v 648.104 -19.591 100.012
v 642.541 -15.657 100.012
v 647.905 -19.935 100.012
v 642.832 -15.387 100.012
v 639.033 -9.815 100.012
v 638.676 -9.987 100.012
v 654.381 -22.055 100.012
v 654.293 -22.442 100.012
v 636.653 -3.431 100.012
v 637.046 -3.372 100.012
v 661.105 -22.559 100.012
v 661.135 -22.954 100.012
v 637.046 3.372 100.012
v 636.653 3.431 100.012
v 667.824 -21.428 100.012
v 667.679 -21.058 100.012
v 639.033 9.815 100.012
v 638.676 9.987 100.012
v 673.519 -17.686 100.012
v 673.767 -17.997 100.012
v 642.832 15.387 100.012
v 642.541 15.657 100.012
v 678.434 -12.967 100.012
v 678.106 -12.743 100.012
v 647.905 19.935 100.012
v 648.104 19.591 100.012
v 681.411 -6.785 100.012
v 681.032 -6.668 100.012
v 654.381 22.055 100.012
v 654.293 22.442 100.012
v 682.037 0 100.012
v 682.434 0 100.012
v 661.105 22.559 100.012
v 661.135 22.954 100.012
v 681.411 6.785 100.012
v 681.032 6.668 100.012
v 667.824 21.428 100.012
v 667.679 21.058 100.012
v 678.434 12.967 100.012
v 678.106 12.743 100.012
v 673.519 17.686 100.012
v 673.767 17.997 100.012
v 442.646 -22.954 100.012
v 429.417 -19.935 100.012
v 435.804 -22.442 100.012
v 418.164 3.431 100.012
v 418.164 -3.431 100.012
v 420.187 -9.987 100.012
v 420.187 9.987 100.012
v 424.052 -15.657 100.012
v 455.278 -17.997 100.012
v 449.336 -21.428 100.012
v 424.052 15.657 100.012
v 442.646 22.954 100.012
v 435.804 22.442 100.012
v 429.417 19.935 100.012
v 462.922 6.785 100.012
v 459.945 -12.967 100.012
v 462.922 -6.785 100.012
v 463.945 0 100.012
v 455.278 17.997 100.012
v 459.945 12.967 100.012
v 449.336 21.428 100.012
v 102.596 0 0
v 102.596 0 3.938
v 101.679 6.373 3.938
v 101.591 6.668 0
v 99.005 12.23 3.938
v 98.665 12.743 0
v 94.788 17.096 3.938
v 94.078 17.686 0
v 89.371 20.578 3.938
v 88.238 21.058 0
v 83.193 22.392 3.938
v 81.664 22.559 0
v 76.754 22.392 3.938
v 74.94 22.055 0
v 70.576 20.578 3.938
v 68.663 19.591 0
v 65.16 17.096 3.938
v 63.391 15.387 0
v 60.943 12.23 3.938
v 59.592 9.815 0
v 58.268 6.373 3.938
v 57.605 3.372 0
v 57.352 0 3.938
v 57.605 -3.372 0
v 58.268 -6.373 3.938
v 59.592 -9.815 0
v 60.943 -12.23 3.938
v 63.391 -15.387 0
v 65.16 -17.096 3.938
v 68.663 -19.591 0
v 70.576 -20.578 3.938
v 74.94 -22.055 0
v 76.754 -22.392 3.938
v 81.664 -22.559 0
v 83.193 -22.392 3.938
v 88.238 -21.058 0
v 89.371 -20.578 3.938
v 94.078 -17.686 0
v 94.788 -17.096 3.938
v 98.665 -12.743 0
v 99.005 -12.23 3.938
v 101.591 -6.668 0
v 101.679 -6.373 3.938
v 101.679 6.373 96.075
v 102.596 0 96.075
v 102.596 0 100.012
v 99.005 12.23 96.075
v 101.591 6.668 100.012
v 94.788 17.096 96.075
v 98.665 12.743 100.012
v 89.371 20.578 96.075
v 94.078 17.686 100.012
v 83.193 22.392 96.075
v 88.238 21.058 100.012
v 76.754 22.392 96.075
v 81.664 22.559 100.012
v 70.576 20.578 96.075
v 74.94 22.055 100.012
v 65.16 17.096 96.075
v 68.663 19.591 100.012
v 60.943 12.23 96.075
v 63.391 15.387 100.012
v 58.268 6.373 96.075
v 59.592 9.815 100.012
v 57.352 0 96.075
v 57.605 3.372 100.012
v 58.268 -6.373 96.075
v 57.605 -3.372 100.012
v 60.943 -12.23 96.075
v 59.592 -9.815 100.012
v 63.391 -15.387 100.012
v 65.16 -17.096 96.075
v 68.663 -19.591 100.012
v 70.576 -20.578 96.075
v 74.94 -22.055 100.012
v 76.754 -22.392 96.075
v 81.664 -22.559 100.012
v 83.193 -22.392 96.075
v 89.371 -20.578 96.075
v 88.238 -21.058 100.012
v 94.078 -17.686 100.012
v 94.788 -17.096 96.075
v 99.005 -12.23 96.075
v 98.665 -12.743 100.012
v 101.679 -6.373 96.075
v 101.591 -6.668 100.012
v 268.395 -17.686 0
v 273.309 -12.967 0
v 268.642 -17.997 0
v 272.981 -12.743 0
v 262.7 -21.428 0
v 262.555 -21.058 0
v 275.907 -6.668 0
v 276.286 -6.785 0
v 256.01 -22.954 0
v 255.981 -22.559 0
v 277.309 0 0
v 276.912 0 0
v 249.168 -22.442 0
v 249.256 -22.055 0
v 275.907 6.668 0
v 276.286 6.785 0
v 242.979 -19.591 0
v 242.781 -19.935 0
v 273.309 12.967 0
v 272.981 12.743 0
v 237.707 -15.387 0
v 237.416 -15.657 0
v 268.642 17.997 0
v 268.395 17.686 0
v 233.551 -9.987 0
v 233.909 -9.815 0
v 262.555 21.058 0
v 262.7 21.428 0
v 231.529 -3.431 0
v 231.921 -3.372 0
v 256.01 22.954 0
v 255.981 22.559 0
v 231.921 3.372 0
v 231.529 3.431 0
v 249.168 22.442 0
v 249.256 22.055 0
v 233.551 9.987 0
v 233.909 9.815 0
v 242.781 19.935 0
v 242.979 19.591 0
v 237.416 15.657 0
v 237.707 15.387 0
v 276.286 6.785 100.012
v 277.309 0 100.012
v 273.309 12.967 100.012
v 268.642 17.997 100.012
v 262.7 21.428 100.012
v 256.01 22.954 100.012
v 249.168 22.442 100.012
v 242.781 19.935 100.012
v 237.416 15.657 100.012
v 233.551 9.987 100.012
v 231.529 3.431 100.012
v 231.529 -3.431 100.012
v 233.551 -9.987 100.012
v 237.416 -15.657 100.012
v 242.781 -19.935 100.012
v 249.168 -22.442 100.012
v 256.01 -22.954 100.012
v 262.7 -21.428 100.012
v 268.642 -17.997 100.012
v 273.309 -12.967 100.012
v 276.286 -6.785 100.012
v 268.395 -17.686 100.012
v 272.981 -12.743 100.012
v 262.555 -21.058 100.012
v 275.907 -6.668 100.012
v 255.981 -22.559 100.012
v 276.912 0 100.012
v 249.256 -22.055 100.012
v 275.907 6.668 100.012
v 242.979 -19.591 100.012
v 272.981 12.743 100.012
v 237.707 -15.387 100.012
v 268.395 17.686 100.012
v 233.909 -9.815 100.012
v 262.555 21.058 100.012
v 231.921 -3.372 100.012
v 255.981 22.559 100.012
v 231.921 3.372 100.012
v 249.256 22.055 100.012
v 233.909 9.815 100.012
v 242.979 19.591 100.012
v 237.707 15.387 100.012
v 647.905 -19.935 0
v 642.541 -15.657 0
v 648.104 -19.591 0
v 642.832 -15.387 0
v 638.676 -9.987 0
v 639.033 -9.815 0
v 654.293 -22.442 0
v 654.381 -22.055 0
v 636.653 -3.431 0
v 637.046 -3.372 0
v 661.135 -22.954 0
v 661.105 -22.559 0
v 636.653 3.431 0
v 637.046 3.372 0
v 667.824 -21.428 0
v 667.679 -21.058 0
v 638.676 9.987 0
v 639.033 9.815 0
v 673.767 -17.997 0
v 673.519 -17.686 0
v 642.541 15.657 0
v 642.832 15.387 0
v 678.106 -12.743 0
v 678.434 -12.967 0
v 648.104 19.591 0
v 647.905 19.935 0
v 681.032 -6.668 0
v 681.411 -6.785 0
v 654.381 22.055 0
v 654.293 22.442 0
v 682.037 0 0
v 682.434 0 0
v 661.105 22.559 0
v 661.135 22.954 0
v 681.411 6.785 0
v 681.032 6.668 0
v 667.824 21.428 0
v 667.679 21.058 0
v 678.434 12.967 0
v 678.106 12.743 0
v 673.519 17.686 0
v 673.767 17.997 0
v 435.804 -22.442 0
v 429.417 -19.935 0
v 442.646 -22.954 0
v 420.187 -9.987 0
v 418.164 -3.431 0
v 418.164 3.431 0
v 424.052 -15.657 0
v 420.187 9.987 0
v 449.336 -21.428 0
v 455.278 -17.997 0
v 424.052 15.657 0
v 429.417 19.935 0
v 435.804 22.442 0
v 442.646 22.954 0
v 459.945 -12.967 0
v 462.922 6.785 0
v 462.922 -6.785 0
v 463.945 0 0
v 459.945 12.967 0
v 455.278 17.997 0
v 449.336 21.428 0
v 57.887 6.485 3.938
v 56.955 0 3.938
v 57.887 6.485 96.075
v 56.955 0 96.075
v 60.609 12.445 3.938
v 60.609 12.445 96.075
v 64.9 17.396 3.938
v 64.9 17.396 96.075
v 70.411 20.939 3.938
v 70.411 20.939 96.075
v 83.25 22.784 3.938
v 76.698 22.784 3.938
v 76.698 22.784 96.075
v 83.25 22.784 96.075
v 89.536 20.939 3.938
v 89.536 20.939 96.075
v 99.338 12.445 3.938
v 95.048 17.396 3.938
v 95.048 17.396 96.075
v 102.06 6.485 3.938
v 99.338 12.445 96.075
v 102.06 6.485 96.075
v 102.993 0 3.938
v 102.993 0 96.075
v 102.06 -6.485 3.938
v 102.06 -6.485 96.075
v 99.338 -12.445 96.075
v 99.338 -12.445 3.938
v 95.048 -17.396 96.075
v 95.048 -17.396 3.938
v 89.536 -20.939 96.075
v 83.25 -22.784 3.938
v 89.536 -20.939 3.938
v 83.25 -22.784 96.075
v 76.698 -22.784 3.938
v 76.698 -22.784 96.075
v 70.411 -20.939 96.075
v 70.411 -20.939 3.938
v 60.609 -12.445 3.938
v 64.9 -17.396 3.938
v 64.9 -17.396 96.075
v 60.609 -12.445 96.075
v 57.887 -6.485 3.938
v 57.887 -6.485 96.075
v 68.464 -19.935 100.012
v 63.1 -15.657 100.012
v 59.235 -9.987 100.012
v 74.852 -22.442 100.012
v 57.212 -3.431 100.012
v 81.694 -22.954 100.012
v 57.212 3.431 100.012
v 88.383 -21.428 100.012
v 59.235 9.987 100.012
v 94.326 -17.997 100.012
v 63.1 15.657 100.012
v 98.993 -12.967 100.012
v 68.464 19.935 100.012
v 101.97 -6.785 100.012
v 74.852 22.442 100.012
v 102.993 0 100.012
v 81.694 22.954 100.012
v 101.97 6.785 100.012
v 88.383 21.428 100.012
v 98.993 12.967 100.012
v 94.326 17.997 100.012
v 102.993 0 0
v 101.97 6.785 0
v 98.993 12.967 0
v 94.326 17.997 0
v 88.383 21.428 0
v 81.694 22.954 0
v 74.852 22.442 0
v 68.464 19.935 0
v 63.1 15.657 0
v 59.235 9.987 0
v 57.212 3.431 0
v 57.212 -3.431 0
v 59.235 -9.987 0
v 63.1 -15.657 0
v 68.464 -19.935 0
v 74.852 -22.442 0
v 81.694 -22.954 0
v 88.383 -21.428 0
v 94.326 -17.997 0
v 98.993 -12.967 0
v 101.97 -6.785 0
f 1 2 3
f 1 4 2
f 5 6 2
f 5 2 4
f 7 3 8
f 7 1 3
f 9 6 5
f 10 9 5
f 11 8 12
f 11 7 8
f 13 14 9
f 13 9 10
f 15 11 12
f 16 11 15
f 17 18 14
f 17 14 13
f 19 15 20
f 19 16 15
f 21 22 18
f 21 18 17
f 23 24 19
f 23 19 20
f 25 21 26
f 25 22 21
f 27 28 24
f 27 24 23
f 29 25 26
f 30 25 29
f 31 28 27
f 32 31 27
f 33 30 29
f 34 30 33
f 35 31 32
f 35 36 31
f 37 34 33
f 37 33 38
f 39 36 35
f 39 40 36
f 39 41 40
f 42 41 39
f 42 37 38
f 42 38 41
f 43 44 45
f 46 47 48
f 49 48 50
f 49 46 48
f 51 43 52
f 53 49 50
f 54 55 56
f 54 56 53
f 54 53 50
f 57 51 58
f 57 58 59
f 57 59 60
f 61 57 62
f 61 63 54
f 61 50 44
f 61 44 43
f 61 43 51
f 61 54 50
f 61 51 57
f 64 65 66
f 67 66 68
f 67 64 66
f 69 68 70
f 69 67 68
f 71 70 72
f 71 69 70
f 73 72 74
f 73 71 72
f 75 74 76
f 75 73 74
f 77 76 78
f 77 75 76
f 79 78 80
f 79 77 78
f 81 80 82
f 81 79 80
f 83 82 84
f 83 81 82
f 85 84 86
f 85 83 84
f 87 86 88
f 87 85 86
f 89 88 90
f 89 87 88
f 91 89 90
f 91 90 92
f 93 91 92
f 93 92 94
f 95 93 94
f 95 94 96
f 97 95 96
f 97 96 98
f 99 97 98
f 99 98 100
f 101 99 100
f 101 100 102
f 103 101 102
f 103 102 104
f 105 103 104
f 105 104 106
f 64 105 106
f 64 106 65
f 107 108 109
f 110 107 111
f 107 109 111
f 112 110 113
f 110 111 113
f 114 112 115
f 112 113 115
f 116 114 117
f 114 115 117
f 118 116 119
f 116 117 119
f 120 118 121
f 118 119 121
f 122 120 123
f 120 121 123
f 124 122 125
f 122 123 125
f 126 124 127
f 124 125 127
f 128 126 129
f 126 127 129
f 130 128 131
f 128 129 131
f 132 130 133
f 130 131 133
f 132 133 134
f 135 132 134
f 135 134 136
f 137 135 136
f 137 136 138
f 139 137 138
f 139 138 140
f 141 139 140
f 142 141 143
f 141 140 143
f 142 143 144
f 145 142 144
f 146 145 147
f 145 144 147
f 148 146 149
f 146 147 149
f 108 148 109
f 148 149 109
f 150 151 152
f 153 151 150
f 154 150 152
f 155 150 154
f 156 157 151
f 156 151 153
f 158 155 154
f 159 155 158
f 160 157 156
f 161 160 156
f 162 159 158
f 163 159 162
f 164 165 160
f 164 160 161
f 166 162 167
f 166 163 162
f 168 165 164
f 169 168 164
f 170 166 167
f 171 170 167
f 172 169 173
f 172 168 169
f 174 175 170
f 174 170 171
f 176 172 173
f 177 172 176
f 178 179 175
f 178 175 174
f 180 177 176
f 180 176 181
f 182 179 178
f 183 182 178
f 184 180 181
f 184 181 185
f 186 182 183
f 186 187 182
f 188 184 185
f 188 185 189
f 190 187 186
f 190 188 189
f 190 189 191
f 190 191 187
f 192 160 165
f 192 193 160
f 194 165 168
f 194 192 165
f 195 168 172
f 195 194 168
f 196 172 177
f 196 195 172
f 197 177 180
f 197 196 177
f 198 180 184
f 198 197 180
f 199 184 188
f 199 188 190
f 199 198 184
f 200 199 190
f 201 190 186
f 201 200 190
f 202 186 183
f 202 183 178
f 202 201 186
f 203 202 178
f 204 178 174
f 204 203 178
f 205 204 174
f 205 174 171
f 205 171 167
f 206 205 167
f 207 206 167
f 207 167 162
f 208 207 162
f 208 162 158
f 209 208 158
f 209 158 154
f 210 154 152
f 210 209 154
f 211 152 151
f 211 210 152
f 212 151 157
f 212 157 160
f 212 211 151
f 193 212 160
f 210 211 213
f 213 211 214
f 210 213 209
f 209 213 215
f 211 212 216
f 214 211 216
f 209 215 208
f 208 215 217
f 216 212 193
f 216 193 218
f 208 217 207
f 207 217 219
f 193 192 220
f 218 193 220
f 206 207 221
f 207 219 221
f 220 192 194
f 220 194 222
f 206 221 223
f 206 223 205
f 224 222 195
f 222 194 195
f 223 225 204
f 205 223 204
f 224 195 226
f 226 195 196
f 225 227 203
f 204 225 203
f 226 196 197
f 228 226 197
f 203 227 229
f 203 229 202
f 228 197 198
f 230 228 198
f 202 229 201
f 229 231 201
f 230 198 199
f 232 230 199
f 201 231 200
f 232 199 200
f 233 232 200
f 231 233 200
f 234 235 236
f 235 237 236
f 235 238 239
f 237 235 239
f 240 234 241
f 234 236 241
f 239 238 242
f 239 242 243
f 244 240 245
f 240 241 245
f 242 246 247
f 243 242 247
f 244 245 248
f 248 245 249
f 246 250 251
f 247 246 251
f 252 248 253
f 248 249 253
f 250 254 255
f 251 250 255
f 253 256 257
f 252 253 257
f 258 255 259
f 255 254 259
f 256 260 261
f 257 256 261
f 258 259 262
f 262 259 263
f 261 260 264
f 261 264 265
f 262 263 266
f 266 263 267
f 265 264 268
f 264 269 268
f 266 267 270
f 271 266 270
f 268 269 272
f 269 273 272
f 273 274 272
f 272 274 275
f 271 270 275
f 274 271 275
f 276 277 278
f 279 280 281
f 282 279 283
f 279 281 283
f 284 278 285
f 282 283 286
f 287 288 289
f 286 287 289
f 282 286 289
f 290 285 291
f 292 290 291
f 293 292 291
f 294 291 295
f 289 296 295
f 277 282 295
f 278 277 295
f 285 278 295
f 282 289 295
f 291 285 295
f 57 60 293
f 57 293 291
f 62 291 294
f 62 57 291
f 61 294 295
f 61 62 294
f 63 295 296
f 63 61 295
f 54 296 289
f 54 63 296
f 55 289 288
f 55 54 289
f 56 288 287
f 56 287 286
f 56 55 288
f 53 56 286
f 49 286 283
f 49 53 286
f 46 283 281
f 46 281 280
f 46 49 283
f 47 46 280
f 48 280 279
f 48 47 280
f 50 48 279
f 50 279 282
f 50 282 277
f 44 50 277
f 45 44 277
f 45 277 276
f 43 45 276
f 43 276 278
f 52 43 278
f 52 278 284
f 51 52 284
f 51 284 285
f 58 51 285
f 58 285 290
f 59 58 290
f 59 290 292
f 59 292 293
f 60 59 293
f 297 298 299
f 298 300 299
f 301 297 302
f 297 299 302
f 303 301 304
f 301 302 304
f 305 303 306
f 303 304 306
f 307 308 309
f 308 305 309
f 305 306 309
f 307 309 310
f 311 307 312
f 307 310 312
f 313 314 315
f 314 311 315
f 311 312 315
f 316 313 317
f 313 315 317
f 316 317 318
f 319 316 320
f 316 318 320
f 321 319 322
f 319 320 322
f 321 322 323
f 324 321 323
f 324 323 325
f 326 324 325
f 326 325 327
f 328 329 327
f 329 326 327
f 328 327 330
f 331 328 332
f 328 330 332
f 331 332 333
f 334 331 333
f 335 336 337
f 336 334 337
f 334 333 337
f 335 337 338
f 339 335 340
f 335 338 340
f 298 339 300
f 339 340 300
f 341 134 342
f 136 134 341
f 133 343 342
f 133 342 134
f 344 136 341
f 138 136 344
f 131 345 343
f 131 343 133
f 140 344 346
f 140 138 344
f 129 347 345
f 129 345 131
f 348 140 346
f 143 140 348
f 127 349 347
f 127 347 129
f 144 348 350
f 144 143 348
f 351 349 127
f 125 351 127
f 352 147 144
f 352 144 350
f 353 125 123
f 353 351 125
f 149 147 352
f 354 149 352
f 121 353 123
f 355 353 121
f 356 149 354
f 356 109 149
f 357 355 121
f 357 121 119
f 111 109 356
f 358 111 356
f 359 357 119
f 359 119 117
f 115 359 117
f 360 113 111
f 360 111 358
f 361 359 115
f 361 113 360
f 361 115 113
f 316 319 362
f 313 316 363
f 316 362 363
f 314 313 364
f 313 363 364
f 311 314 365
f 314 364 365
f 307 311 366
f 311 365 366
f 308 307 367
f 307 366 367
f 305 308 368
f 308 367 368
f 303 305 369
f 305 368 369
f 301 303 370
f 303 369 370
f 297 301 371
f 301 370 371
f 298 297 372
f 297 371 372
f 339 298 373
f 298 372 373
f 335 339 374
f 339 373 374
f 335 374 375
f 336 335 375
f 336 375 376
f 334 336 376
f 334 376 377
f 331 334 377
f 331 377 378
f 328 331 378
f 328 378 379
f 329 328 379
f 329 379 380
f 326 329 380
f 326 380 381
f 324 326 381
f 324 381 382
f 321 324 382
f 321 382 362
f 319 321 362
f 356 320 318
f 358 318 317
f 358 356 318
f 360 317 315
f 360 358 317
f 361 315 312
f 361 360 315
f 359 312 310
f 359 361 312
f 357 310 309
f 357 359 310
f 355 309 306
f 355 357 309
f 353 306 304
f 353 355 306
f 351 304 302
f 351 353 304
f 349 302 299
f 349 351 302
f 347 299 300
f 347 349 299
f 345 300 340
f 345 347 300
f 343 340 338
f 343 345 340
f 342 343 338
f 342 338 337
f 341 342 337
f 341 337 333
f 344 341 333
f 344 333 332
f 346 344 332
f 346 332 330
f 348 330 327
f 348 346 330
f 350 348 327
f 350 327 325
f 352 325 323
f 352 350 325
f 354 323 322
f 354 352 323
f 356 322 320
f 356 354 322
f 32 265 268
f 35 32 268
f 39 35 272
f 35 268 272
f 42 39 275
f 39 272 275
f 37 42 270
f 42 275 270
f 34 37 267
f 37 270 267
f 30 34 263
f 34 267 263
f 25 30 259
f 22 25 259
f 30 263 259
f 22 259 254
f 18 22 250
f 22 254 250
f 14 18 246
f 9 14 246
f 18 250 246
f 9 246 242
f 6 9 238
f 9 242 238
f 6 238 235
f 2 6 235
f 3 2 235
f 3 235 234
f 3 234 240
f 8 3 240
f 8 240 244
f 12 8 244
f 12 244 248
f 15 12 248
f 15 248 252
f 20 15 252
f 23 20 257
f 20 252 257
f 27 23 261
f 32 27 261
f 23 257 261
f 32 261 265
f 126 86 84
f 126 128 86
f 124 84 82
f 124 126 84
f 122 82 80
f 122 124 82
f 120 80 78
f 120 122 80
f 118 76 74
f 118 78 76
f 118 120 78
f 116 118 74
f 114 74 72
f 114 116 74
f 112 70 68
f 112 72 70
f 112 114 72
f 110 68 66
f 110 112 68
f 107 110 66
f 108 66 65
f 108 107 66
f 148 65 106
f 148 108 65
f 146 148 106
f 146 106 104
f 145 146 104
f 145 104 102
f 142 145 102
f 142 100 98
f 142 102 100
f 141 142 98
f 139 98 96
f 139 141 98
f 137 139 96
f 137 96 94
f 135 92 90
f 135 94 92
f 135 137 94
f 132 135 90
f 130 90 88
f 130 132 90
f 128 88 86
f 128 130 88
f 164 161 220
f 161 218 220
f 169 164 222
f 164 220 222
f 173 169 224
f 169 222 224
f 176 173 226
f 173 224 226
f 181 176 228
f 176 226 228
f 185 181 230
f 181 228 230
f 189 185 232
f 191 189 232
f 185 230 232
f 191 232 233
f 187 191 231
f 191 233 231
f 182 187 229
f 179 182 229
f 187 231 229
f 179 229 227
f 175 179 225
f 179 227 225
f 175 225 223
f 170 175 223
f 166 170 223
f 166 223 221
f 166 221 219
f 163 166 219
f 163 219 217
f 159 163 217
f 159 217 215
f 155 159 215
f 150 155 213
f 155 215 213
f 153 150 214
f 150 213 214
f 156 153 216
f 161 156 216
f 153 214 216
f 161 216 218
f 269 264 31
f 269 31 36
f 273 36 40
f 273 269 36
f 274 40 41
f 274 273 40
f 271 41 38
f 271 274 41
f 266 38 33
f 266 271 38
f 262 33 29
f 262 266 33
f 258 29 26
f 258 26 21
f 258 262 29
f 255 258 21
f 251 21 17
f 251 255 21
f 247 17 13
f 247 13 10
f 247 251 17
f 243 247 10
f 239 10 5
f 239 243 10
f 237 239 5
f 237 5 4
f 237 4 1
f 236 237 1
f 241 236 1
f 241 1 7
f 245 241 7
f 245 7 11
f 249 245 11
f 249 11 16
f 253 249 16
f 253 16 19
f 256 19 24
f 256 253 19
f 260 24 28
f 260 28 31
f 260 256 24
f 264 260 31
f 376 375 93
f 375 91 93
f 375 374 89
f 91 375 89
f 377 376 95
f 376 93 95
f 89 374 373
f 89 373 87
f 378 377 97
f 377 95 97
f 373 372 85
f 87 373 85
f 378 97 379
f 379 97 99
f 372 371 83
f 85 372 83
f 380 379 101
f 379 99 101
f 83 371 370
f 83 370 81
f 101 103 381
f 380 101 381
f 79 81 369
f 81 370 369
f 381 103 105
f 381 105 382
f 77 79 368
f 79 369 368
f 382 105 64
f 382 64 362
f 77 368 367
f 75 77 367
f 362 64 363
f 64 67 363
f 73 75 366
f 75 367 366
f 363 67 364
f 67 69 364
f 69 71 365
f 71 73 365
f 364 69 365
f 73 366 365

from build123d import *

# Parameters (mm, degrees)
F0_R     = 23.01875
F0_R_2   = 22.621875
F1_DEPTH = 3.9375
F2_W     = 0.396875
F2_H     = 100.0125
F5_R     = 23.01875
F5_R_2   = 22.8203125
F7_R     = 23.01875
F7_R_2   = 22.621875
F8_DEPTH = 100.0125


# Not quite as in the source:
# - a pattern or mirror of a feature is missing from the dataset's text; its kind, count and spacing are read off the source's solid


with BuildPart() as f1:
    # F0 (on Top) → F1 (new body)
    with BuildSketch(Plane.XY):
        with Locations((79.9737968977, 0)):
            Circle(F0_R)
        with Locations((79.9737968977, 0)):
            Circle(F0_R_2, mode=Mode.SUBTRACT)
    extrude(amount=F1_DEPTH)


with BuildPart() as f1_copies_1:
    # F1_copies: instance of F1
    add(f1.part.mirror(Plane.XY.offset(50.00625)))


with BuildPart() as f3:
    # F2 (on Front) → F3 (revolve)
    with BuildSketch(Plane.XZ):
        with Locations((277.110565424, 50.00625)):
            Rectangle(F2_W, F2_H)
    revolve(axis=Axis((254.290252924, 0, 67.7974149585), (0, 0, 1)))


with BuildPart() as f1_1:
    add(f1.part)

    add(f1_copies_1.part)  # F3_copies merges F1_copies_1
    # F3_copies: F3 across plane
    add(f3.part.mirror(Plane(origin=(167.132025, 0, 0), x_dir=(0, 0, -1), z_dir=(-1, 0, 0))))


with BuildPart() as f6:
    # F6: sweep along a path in F4
    with BuildLine(Plane.XZ) as f6_path:
        Line((440.9259481555, 0), (440.9259481555, 100.0125))
    # F5 (on Top) → F6 (sweep)
    with BuildSketch(Plane.XY):
        with Locations((440.9259481555, 0)):
            Circle(F5_R)
        with Locations((440.9259481555, 0)):
            Circle(F5_R_2, mode=Mode.SUBTRACT)
        with Locations((440.9259481555, 0)):
            Circle(F5_R_2)
    sweep(path=f6_path.line)


with BuildPart() as f8:
    # F7 (on Top) → F8 (new body)
    with BuildSketch(Plane.XY):
        with Locations((659.4147582325, 0)):
            Circle(F7_R)
        with Locations((659.4147582325, 0)):
            Circle(F7_R_2, mode=Mode.SUBTRACT)
    extrude(amount=F8_DEPTH)


solid = Compound([f3.part, f1_1.part, f6.part, f8.part])
